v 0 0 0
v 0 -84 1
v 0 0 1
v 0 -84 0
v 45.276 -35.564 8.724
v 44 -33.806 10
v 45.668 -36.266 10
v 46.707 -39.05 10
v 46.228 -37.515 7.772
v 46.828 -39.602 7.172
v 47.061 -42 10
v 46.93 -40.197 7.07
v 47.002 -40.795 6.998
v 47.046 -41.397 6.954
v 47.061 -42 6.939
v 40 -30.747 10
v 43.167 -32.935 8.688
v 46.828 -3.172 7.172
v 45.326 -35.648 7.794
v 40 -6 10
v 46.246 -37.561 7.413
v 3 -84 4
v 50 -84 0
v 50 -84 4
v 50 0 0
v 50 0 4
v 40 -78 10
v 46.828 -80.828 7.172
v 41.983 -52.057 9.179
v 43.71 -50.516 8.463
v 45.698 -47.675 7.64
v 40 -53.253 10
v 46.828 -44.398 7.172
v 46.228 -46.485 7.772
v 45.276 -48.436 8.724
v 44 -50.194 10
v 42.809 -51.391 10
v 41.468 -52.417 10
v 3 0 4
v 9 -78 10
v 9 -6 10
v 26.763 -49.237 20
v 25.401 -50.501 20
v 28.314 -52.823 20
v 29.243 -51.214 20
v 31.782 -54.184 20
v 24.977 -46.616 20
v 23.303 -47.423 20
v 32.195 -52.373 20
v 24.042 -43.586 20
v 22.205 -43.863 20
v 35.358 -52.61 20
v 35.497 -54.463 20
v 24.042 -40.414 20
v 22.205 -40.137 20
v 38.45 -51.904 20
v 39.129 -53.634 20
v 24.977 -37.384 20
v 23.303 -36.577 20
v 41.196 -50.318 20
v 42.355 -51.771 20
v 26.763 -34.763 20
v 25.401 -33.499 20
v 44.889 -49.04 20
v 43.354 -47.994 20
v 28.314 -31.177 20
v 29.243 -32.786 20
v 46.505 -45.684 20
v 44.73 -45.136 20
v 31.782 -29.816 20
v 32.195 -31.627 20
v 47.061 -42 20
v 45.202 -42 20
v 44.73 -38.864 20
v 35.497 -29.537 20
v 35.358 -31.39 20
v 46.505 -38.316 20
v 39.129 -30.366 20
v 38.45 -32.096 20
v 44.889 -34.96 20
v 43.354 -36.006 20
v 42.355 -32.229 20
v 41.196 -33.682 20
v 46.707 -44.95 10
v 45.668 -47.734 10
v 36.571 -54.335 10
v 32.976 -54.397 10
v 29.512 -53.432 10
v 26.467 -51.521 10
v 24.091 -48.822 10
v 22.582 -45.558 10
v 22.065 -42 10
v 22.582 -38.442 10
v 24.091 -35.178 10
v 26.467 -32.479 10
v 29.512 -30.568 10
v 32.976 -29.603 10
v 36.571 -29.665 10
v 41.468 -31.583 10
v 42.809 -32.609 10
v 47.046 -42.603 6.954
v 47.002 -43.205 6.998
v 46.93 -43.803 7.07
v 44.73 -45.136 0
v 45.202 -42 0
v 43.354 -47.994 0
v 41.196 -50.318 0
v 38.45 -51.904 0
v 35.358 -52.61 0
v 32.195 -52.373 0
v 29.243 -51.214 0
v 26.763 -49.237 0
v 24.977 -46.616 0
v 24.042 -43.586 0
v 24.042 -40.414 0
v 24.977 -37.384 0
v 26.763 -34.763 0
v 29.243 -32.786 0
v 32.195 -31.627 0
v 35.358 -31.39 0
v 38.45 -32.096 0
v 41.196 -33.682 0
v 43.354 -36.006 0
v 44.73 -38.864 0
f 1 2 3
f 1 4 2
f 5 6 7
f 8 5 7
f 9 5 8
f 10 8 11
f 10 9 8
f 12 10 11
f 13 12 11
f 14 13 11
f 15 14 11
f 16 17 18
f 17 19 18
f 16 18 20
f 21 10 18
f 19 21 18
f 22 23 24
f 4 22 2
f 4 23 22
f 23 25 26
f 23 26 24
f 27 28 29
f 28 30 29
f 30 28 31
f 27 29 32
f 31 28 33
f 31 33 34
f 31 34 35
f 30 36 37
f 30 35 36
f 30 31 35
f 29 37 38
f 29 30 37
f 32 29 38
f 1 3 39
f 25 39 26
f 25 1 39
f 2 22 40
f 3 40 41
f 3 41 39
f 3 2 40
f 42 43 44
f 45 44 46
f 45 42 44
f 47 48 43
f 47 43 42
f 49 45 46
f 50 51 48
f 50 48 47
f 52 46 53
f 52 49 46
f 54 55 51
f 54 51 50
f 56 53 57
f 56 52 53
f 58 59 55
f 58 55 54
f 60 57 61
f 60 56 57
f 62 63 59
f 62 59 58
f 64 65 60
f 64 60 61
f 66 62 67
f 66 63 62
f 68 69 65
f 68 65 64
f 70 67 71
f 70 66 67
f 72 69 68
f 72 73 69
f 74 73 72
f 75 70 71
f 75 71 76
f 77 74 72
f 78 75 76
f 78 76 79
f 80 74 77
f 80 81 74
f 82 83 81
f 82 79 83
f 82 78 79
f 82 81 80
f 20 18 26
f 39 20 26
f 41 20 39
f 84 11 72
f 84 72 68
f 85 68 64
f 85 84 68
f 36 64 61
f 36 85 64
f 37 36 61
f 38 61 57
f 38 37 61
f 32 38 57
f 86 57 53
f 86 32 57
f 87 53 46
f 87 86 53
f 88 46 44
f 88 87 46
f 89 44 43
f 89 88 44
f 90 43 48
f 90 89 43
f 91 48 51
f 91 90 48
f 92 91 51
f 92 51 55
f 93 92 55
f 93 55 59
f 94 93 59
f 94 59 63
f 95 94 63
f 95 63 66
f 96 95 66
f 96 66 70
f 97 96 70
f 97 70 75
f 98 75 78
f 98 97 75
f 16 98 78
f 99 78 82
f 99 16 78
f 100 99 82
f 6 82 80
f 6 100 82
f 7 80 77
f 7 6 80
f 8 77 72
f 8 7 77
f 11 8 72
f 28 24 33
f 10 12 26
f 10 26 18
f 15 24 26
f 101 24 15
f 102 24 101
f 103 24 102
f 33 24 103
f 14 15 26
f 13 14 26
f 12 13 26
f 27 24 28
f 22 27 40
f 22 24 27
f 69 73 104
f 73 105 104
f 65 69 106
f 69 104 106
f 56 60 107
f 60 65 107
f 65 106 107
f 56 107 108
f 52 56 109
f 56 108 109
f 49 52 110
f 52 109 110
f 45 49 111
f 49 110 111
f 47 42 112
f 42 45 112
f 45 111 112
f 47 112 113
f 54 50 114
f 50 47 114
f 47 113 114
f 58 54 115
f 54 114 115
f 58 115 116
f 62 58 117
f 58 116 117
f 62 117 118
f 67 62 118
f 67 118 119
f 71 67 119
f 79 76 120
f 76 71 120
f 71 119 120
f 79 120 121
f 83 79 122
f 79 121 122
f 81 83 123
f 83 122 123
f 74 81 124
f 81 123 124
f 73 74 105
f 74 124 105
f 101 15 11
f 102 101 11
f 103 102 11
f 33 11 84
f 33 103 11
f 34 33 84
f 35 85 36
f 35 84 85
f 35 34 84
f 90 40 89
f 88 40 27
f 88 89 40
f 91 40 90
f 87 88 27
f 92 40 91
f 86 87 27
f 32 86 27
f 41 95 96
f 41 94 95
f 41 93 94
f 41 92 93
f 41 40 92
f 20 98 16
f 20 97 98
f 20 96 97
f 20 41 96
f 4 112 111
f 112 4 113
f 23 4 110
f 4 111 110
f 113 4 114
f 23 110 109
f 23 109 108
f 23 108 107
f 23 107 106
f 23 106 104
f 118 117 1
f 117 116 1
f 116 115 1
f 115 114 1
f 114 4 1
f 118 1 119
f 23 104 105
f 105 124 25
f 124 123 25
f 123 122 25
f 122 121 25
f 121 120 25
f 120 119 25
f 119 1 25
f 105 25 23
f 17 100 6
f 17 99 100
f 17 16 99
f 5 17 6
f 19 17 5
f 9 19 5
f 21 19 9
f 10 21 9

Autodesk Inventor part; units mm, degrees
ref_plane "YZ Plane" through (0, 0, 0) normal (1, 0, 0) x (0, 1, 0)
ref_plane "XZ Plane" through (0, 0, 0) normal (0, 1, 0) x (-1, 0, 0)
ref_plane "XY Plane" through (0, 0, 0) normal (0, 0, 1) x (1, 0, 0)
sketch "Sketch1" plane through (0, 0, 0) normal (0, 0, 1) x (1, 0, 0)
  line L0 (0, 0) -> (50, 0)
  line L1 (50, 0) -> (50, -84)
  line L2 (50, -84) -> (0, -84)
  line L3 (0, -84) -> (0, 0)
  circle A0 centre (34.5628, -42) radius 12.4978
  circle A1 centre (34.5628, -42) radius 10.6396
  dimension "d0" = 50
  dimension "d1" = 84
extrude "Extrusion1" add sketch "Sketch1" along normal blind 10 contours L0 L1 L2 L3
extrude "Extrusion2" add sketch "Sketch1" along normal blind 20 contours A0
chamfer "Chamfer1" distance 6 angle 45 1 edges at (50, -42, 10)
chamfer "Chamfer2" distance 4 angle 45 2 edges at (44, -67.0968, 10) (44, -16.9032, 10)
chamfer "Chamfer3" distance 9 angle 45 1 edges at (0, -42, 10)
chamfer "Chamfer4" distance 6 angle 45 2 edges at (24.5, 0, 10) (24.5, -84, 10)
equation "\"BendRadius\" = Thickness"
equation "\"BendReliefWidth\" = Thickness"
equation "\"BendReliefDepth\" = 0.5 * Thickness"
equation "\"CornerReliefSize\" = 4 * Thickness"
equation "\"MinimumRemnant\" = 2 * Thickness"
equation "\"TransitionRadius\" = BendRadius"
equation "\"JacobiRadiusSize\" = BendRadius"
equation "\"GapSize\" = Thickness"
equation "\"Thickness\" = 0.5"
